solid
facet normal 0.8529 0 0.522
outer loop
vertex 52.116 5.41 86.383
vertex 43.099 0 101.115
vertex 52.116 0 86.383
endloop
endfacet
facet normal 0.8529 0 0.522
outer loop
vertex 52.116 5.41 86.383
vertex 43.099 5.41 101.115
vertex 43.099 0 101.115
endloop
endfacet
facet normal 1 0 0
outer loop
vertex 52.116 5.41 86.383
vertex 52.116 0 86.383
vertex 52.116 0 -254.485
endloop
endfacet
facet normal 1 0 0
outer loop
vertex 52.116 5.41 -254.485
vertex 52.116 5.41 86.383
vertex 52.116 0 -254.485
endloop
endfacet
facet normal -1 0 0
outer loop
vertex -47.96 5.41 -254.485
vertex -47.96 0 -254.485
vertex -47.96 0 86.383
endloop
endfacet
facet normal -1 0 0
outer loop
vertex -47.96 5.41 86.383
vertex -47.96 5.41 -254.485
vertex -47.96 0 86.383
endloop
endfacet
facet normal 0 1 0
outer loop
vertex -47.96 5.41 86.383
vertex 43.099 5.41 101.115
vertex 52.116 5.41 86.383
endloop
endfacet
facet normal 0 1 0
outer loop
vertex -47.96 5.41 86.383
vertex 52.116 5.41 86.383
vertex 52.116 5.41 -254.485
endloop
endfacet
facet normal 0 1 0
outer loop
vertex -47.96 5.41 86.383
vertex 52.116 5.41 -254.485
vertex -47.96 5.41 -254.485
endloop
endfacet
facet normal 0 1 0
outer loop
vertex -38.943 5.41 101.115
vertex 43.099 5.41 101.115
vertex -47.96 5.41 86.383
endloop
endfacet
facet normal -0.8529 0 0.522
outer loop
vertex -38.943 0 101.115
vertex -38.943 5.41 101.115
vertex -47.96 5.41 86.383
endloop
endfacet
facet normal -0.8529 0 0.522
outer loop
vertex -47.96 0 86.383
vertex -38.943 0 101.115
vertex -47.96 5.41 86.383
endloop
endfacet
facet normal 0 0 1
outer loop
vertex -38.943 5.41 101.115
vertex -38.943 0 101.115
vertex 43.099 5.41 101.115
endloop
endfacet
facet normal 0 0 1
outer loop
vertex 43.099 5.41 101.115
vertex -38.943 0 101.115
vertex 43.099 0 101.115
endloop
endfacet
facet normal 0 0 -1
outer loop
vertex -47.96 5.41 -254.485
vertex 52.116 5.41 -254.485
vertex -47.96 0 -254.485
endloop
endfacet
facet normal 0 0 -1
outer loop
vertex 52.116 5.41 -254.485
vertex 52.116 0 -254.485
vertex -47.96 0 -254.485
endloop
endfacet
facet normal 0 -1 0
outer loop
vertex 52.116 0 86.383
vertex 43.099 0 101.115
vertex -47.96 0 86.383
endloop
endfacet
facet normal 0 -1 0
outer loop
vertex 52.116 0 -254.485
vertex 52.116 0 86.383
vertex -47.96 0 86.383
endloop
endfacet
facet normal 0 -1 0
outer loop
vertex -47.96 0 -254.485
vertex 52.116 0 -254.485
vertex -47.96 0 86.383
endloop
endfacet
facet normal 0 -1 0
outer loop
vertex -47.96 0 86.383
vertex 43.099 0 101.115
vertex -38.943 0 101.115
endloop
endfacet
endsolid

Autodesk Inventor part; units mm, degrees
ref_plane "YZ Plane" through (0, 0, 0) normal (1, 0, 0) x (0, 1, 0)
ref_plane "XZ Plane" through (0, 0, 0) normal (0, 1, 0) x (-1, 0, 0)
ref_plane "XY Plane" through (0, 0, 0) normal (0, 0, 1) x (1, 0, 0)
sketch "Sketch1" plane through (0, 0, 0) normal (0, 1, 0) x (-1, 0, 0)
  line L0 (47.9603, 101.1149) -> (-52.1157, 101.1149)
  line L1 (-52.1157, 101.1149) -> (-52.1157, -254.4851)
  line L2 (-52.1157, -254.4851) -> (47.9603, -254.4851)
  line L3 (47.9603, -254.4851) -> (47.9603, 101.1149)
  point P0 (0, 0)
  dimension "d0" = 100.076
  dimension "d1" = 355.6
extrude "Extrusion1" add sketch "Sketch1" along normal blind 5.4102
sketch "Sketch4" plane through (0, 5.4102, 0) normal (0, 1, 0) x (1, 0, 0)
  line L0 (-47.9603, 254.4851) -> (-47.9603, -101.1149) projected
  line L1 (-47.9603, -86.3829) -> (52.1157, -86.3829)
  line L2 (52.1157, -101.1149) -> (52.1157, 254.4851) projected
  line L3 (-47.9603, -101.1149) -> (52.1157, -101.1149) projected
  line L4 (-47.9603, -101.1149) -> (-38.9433, -101.1149)
  line L5 (-38.9433, -101.1149) -> (-47.9603, -86.3829)
  line L6 (-47.9603, -86.3829) -> (-47.9603, -101.1149)
  line L7 (2.0777, -101.1149) -> (2.0777, -39.9393)
  line L8 (43.0987, -101.1149) -> (52.1157, -86.3829)
  line L9 (43.0987, -101.1149) -> (52.1157, -101.1149)
  line L10 (52.1157, -86.3829) -> (52.1157, -101.1149)
  point P0 (0, 0)
  dimension "d4" = 14.732
  dimension "d5" = 9.017
extrude "Extrusion2" cut sketch "Sketch4" against normal blind 5.4102 contours L5 L3 L0 | L2 L3 L8
properties part number "Control Board"
